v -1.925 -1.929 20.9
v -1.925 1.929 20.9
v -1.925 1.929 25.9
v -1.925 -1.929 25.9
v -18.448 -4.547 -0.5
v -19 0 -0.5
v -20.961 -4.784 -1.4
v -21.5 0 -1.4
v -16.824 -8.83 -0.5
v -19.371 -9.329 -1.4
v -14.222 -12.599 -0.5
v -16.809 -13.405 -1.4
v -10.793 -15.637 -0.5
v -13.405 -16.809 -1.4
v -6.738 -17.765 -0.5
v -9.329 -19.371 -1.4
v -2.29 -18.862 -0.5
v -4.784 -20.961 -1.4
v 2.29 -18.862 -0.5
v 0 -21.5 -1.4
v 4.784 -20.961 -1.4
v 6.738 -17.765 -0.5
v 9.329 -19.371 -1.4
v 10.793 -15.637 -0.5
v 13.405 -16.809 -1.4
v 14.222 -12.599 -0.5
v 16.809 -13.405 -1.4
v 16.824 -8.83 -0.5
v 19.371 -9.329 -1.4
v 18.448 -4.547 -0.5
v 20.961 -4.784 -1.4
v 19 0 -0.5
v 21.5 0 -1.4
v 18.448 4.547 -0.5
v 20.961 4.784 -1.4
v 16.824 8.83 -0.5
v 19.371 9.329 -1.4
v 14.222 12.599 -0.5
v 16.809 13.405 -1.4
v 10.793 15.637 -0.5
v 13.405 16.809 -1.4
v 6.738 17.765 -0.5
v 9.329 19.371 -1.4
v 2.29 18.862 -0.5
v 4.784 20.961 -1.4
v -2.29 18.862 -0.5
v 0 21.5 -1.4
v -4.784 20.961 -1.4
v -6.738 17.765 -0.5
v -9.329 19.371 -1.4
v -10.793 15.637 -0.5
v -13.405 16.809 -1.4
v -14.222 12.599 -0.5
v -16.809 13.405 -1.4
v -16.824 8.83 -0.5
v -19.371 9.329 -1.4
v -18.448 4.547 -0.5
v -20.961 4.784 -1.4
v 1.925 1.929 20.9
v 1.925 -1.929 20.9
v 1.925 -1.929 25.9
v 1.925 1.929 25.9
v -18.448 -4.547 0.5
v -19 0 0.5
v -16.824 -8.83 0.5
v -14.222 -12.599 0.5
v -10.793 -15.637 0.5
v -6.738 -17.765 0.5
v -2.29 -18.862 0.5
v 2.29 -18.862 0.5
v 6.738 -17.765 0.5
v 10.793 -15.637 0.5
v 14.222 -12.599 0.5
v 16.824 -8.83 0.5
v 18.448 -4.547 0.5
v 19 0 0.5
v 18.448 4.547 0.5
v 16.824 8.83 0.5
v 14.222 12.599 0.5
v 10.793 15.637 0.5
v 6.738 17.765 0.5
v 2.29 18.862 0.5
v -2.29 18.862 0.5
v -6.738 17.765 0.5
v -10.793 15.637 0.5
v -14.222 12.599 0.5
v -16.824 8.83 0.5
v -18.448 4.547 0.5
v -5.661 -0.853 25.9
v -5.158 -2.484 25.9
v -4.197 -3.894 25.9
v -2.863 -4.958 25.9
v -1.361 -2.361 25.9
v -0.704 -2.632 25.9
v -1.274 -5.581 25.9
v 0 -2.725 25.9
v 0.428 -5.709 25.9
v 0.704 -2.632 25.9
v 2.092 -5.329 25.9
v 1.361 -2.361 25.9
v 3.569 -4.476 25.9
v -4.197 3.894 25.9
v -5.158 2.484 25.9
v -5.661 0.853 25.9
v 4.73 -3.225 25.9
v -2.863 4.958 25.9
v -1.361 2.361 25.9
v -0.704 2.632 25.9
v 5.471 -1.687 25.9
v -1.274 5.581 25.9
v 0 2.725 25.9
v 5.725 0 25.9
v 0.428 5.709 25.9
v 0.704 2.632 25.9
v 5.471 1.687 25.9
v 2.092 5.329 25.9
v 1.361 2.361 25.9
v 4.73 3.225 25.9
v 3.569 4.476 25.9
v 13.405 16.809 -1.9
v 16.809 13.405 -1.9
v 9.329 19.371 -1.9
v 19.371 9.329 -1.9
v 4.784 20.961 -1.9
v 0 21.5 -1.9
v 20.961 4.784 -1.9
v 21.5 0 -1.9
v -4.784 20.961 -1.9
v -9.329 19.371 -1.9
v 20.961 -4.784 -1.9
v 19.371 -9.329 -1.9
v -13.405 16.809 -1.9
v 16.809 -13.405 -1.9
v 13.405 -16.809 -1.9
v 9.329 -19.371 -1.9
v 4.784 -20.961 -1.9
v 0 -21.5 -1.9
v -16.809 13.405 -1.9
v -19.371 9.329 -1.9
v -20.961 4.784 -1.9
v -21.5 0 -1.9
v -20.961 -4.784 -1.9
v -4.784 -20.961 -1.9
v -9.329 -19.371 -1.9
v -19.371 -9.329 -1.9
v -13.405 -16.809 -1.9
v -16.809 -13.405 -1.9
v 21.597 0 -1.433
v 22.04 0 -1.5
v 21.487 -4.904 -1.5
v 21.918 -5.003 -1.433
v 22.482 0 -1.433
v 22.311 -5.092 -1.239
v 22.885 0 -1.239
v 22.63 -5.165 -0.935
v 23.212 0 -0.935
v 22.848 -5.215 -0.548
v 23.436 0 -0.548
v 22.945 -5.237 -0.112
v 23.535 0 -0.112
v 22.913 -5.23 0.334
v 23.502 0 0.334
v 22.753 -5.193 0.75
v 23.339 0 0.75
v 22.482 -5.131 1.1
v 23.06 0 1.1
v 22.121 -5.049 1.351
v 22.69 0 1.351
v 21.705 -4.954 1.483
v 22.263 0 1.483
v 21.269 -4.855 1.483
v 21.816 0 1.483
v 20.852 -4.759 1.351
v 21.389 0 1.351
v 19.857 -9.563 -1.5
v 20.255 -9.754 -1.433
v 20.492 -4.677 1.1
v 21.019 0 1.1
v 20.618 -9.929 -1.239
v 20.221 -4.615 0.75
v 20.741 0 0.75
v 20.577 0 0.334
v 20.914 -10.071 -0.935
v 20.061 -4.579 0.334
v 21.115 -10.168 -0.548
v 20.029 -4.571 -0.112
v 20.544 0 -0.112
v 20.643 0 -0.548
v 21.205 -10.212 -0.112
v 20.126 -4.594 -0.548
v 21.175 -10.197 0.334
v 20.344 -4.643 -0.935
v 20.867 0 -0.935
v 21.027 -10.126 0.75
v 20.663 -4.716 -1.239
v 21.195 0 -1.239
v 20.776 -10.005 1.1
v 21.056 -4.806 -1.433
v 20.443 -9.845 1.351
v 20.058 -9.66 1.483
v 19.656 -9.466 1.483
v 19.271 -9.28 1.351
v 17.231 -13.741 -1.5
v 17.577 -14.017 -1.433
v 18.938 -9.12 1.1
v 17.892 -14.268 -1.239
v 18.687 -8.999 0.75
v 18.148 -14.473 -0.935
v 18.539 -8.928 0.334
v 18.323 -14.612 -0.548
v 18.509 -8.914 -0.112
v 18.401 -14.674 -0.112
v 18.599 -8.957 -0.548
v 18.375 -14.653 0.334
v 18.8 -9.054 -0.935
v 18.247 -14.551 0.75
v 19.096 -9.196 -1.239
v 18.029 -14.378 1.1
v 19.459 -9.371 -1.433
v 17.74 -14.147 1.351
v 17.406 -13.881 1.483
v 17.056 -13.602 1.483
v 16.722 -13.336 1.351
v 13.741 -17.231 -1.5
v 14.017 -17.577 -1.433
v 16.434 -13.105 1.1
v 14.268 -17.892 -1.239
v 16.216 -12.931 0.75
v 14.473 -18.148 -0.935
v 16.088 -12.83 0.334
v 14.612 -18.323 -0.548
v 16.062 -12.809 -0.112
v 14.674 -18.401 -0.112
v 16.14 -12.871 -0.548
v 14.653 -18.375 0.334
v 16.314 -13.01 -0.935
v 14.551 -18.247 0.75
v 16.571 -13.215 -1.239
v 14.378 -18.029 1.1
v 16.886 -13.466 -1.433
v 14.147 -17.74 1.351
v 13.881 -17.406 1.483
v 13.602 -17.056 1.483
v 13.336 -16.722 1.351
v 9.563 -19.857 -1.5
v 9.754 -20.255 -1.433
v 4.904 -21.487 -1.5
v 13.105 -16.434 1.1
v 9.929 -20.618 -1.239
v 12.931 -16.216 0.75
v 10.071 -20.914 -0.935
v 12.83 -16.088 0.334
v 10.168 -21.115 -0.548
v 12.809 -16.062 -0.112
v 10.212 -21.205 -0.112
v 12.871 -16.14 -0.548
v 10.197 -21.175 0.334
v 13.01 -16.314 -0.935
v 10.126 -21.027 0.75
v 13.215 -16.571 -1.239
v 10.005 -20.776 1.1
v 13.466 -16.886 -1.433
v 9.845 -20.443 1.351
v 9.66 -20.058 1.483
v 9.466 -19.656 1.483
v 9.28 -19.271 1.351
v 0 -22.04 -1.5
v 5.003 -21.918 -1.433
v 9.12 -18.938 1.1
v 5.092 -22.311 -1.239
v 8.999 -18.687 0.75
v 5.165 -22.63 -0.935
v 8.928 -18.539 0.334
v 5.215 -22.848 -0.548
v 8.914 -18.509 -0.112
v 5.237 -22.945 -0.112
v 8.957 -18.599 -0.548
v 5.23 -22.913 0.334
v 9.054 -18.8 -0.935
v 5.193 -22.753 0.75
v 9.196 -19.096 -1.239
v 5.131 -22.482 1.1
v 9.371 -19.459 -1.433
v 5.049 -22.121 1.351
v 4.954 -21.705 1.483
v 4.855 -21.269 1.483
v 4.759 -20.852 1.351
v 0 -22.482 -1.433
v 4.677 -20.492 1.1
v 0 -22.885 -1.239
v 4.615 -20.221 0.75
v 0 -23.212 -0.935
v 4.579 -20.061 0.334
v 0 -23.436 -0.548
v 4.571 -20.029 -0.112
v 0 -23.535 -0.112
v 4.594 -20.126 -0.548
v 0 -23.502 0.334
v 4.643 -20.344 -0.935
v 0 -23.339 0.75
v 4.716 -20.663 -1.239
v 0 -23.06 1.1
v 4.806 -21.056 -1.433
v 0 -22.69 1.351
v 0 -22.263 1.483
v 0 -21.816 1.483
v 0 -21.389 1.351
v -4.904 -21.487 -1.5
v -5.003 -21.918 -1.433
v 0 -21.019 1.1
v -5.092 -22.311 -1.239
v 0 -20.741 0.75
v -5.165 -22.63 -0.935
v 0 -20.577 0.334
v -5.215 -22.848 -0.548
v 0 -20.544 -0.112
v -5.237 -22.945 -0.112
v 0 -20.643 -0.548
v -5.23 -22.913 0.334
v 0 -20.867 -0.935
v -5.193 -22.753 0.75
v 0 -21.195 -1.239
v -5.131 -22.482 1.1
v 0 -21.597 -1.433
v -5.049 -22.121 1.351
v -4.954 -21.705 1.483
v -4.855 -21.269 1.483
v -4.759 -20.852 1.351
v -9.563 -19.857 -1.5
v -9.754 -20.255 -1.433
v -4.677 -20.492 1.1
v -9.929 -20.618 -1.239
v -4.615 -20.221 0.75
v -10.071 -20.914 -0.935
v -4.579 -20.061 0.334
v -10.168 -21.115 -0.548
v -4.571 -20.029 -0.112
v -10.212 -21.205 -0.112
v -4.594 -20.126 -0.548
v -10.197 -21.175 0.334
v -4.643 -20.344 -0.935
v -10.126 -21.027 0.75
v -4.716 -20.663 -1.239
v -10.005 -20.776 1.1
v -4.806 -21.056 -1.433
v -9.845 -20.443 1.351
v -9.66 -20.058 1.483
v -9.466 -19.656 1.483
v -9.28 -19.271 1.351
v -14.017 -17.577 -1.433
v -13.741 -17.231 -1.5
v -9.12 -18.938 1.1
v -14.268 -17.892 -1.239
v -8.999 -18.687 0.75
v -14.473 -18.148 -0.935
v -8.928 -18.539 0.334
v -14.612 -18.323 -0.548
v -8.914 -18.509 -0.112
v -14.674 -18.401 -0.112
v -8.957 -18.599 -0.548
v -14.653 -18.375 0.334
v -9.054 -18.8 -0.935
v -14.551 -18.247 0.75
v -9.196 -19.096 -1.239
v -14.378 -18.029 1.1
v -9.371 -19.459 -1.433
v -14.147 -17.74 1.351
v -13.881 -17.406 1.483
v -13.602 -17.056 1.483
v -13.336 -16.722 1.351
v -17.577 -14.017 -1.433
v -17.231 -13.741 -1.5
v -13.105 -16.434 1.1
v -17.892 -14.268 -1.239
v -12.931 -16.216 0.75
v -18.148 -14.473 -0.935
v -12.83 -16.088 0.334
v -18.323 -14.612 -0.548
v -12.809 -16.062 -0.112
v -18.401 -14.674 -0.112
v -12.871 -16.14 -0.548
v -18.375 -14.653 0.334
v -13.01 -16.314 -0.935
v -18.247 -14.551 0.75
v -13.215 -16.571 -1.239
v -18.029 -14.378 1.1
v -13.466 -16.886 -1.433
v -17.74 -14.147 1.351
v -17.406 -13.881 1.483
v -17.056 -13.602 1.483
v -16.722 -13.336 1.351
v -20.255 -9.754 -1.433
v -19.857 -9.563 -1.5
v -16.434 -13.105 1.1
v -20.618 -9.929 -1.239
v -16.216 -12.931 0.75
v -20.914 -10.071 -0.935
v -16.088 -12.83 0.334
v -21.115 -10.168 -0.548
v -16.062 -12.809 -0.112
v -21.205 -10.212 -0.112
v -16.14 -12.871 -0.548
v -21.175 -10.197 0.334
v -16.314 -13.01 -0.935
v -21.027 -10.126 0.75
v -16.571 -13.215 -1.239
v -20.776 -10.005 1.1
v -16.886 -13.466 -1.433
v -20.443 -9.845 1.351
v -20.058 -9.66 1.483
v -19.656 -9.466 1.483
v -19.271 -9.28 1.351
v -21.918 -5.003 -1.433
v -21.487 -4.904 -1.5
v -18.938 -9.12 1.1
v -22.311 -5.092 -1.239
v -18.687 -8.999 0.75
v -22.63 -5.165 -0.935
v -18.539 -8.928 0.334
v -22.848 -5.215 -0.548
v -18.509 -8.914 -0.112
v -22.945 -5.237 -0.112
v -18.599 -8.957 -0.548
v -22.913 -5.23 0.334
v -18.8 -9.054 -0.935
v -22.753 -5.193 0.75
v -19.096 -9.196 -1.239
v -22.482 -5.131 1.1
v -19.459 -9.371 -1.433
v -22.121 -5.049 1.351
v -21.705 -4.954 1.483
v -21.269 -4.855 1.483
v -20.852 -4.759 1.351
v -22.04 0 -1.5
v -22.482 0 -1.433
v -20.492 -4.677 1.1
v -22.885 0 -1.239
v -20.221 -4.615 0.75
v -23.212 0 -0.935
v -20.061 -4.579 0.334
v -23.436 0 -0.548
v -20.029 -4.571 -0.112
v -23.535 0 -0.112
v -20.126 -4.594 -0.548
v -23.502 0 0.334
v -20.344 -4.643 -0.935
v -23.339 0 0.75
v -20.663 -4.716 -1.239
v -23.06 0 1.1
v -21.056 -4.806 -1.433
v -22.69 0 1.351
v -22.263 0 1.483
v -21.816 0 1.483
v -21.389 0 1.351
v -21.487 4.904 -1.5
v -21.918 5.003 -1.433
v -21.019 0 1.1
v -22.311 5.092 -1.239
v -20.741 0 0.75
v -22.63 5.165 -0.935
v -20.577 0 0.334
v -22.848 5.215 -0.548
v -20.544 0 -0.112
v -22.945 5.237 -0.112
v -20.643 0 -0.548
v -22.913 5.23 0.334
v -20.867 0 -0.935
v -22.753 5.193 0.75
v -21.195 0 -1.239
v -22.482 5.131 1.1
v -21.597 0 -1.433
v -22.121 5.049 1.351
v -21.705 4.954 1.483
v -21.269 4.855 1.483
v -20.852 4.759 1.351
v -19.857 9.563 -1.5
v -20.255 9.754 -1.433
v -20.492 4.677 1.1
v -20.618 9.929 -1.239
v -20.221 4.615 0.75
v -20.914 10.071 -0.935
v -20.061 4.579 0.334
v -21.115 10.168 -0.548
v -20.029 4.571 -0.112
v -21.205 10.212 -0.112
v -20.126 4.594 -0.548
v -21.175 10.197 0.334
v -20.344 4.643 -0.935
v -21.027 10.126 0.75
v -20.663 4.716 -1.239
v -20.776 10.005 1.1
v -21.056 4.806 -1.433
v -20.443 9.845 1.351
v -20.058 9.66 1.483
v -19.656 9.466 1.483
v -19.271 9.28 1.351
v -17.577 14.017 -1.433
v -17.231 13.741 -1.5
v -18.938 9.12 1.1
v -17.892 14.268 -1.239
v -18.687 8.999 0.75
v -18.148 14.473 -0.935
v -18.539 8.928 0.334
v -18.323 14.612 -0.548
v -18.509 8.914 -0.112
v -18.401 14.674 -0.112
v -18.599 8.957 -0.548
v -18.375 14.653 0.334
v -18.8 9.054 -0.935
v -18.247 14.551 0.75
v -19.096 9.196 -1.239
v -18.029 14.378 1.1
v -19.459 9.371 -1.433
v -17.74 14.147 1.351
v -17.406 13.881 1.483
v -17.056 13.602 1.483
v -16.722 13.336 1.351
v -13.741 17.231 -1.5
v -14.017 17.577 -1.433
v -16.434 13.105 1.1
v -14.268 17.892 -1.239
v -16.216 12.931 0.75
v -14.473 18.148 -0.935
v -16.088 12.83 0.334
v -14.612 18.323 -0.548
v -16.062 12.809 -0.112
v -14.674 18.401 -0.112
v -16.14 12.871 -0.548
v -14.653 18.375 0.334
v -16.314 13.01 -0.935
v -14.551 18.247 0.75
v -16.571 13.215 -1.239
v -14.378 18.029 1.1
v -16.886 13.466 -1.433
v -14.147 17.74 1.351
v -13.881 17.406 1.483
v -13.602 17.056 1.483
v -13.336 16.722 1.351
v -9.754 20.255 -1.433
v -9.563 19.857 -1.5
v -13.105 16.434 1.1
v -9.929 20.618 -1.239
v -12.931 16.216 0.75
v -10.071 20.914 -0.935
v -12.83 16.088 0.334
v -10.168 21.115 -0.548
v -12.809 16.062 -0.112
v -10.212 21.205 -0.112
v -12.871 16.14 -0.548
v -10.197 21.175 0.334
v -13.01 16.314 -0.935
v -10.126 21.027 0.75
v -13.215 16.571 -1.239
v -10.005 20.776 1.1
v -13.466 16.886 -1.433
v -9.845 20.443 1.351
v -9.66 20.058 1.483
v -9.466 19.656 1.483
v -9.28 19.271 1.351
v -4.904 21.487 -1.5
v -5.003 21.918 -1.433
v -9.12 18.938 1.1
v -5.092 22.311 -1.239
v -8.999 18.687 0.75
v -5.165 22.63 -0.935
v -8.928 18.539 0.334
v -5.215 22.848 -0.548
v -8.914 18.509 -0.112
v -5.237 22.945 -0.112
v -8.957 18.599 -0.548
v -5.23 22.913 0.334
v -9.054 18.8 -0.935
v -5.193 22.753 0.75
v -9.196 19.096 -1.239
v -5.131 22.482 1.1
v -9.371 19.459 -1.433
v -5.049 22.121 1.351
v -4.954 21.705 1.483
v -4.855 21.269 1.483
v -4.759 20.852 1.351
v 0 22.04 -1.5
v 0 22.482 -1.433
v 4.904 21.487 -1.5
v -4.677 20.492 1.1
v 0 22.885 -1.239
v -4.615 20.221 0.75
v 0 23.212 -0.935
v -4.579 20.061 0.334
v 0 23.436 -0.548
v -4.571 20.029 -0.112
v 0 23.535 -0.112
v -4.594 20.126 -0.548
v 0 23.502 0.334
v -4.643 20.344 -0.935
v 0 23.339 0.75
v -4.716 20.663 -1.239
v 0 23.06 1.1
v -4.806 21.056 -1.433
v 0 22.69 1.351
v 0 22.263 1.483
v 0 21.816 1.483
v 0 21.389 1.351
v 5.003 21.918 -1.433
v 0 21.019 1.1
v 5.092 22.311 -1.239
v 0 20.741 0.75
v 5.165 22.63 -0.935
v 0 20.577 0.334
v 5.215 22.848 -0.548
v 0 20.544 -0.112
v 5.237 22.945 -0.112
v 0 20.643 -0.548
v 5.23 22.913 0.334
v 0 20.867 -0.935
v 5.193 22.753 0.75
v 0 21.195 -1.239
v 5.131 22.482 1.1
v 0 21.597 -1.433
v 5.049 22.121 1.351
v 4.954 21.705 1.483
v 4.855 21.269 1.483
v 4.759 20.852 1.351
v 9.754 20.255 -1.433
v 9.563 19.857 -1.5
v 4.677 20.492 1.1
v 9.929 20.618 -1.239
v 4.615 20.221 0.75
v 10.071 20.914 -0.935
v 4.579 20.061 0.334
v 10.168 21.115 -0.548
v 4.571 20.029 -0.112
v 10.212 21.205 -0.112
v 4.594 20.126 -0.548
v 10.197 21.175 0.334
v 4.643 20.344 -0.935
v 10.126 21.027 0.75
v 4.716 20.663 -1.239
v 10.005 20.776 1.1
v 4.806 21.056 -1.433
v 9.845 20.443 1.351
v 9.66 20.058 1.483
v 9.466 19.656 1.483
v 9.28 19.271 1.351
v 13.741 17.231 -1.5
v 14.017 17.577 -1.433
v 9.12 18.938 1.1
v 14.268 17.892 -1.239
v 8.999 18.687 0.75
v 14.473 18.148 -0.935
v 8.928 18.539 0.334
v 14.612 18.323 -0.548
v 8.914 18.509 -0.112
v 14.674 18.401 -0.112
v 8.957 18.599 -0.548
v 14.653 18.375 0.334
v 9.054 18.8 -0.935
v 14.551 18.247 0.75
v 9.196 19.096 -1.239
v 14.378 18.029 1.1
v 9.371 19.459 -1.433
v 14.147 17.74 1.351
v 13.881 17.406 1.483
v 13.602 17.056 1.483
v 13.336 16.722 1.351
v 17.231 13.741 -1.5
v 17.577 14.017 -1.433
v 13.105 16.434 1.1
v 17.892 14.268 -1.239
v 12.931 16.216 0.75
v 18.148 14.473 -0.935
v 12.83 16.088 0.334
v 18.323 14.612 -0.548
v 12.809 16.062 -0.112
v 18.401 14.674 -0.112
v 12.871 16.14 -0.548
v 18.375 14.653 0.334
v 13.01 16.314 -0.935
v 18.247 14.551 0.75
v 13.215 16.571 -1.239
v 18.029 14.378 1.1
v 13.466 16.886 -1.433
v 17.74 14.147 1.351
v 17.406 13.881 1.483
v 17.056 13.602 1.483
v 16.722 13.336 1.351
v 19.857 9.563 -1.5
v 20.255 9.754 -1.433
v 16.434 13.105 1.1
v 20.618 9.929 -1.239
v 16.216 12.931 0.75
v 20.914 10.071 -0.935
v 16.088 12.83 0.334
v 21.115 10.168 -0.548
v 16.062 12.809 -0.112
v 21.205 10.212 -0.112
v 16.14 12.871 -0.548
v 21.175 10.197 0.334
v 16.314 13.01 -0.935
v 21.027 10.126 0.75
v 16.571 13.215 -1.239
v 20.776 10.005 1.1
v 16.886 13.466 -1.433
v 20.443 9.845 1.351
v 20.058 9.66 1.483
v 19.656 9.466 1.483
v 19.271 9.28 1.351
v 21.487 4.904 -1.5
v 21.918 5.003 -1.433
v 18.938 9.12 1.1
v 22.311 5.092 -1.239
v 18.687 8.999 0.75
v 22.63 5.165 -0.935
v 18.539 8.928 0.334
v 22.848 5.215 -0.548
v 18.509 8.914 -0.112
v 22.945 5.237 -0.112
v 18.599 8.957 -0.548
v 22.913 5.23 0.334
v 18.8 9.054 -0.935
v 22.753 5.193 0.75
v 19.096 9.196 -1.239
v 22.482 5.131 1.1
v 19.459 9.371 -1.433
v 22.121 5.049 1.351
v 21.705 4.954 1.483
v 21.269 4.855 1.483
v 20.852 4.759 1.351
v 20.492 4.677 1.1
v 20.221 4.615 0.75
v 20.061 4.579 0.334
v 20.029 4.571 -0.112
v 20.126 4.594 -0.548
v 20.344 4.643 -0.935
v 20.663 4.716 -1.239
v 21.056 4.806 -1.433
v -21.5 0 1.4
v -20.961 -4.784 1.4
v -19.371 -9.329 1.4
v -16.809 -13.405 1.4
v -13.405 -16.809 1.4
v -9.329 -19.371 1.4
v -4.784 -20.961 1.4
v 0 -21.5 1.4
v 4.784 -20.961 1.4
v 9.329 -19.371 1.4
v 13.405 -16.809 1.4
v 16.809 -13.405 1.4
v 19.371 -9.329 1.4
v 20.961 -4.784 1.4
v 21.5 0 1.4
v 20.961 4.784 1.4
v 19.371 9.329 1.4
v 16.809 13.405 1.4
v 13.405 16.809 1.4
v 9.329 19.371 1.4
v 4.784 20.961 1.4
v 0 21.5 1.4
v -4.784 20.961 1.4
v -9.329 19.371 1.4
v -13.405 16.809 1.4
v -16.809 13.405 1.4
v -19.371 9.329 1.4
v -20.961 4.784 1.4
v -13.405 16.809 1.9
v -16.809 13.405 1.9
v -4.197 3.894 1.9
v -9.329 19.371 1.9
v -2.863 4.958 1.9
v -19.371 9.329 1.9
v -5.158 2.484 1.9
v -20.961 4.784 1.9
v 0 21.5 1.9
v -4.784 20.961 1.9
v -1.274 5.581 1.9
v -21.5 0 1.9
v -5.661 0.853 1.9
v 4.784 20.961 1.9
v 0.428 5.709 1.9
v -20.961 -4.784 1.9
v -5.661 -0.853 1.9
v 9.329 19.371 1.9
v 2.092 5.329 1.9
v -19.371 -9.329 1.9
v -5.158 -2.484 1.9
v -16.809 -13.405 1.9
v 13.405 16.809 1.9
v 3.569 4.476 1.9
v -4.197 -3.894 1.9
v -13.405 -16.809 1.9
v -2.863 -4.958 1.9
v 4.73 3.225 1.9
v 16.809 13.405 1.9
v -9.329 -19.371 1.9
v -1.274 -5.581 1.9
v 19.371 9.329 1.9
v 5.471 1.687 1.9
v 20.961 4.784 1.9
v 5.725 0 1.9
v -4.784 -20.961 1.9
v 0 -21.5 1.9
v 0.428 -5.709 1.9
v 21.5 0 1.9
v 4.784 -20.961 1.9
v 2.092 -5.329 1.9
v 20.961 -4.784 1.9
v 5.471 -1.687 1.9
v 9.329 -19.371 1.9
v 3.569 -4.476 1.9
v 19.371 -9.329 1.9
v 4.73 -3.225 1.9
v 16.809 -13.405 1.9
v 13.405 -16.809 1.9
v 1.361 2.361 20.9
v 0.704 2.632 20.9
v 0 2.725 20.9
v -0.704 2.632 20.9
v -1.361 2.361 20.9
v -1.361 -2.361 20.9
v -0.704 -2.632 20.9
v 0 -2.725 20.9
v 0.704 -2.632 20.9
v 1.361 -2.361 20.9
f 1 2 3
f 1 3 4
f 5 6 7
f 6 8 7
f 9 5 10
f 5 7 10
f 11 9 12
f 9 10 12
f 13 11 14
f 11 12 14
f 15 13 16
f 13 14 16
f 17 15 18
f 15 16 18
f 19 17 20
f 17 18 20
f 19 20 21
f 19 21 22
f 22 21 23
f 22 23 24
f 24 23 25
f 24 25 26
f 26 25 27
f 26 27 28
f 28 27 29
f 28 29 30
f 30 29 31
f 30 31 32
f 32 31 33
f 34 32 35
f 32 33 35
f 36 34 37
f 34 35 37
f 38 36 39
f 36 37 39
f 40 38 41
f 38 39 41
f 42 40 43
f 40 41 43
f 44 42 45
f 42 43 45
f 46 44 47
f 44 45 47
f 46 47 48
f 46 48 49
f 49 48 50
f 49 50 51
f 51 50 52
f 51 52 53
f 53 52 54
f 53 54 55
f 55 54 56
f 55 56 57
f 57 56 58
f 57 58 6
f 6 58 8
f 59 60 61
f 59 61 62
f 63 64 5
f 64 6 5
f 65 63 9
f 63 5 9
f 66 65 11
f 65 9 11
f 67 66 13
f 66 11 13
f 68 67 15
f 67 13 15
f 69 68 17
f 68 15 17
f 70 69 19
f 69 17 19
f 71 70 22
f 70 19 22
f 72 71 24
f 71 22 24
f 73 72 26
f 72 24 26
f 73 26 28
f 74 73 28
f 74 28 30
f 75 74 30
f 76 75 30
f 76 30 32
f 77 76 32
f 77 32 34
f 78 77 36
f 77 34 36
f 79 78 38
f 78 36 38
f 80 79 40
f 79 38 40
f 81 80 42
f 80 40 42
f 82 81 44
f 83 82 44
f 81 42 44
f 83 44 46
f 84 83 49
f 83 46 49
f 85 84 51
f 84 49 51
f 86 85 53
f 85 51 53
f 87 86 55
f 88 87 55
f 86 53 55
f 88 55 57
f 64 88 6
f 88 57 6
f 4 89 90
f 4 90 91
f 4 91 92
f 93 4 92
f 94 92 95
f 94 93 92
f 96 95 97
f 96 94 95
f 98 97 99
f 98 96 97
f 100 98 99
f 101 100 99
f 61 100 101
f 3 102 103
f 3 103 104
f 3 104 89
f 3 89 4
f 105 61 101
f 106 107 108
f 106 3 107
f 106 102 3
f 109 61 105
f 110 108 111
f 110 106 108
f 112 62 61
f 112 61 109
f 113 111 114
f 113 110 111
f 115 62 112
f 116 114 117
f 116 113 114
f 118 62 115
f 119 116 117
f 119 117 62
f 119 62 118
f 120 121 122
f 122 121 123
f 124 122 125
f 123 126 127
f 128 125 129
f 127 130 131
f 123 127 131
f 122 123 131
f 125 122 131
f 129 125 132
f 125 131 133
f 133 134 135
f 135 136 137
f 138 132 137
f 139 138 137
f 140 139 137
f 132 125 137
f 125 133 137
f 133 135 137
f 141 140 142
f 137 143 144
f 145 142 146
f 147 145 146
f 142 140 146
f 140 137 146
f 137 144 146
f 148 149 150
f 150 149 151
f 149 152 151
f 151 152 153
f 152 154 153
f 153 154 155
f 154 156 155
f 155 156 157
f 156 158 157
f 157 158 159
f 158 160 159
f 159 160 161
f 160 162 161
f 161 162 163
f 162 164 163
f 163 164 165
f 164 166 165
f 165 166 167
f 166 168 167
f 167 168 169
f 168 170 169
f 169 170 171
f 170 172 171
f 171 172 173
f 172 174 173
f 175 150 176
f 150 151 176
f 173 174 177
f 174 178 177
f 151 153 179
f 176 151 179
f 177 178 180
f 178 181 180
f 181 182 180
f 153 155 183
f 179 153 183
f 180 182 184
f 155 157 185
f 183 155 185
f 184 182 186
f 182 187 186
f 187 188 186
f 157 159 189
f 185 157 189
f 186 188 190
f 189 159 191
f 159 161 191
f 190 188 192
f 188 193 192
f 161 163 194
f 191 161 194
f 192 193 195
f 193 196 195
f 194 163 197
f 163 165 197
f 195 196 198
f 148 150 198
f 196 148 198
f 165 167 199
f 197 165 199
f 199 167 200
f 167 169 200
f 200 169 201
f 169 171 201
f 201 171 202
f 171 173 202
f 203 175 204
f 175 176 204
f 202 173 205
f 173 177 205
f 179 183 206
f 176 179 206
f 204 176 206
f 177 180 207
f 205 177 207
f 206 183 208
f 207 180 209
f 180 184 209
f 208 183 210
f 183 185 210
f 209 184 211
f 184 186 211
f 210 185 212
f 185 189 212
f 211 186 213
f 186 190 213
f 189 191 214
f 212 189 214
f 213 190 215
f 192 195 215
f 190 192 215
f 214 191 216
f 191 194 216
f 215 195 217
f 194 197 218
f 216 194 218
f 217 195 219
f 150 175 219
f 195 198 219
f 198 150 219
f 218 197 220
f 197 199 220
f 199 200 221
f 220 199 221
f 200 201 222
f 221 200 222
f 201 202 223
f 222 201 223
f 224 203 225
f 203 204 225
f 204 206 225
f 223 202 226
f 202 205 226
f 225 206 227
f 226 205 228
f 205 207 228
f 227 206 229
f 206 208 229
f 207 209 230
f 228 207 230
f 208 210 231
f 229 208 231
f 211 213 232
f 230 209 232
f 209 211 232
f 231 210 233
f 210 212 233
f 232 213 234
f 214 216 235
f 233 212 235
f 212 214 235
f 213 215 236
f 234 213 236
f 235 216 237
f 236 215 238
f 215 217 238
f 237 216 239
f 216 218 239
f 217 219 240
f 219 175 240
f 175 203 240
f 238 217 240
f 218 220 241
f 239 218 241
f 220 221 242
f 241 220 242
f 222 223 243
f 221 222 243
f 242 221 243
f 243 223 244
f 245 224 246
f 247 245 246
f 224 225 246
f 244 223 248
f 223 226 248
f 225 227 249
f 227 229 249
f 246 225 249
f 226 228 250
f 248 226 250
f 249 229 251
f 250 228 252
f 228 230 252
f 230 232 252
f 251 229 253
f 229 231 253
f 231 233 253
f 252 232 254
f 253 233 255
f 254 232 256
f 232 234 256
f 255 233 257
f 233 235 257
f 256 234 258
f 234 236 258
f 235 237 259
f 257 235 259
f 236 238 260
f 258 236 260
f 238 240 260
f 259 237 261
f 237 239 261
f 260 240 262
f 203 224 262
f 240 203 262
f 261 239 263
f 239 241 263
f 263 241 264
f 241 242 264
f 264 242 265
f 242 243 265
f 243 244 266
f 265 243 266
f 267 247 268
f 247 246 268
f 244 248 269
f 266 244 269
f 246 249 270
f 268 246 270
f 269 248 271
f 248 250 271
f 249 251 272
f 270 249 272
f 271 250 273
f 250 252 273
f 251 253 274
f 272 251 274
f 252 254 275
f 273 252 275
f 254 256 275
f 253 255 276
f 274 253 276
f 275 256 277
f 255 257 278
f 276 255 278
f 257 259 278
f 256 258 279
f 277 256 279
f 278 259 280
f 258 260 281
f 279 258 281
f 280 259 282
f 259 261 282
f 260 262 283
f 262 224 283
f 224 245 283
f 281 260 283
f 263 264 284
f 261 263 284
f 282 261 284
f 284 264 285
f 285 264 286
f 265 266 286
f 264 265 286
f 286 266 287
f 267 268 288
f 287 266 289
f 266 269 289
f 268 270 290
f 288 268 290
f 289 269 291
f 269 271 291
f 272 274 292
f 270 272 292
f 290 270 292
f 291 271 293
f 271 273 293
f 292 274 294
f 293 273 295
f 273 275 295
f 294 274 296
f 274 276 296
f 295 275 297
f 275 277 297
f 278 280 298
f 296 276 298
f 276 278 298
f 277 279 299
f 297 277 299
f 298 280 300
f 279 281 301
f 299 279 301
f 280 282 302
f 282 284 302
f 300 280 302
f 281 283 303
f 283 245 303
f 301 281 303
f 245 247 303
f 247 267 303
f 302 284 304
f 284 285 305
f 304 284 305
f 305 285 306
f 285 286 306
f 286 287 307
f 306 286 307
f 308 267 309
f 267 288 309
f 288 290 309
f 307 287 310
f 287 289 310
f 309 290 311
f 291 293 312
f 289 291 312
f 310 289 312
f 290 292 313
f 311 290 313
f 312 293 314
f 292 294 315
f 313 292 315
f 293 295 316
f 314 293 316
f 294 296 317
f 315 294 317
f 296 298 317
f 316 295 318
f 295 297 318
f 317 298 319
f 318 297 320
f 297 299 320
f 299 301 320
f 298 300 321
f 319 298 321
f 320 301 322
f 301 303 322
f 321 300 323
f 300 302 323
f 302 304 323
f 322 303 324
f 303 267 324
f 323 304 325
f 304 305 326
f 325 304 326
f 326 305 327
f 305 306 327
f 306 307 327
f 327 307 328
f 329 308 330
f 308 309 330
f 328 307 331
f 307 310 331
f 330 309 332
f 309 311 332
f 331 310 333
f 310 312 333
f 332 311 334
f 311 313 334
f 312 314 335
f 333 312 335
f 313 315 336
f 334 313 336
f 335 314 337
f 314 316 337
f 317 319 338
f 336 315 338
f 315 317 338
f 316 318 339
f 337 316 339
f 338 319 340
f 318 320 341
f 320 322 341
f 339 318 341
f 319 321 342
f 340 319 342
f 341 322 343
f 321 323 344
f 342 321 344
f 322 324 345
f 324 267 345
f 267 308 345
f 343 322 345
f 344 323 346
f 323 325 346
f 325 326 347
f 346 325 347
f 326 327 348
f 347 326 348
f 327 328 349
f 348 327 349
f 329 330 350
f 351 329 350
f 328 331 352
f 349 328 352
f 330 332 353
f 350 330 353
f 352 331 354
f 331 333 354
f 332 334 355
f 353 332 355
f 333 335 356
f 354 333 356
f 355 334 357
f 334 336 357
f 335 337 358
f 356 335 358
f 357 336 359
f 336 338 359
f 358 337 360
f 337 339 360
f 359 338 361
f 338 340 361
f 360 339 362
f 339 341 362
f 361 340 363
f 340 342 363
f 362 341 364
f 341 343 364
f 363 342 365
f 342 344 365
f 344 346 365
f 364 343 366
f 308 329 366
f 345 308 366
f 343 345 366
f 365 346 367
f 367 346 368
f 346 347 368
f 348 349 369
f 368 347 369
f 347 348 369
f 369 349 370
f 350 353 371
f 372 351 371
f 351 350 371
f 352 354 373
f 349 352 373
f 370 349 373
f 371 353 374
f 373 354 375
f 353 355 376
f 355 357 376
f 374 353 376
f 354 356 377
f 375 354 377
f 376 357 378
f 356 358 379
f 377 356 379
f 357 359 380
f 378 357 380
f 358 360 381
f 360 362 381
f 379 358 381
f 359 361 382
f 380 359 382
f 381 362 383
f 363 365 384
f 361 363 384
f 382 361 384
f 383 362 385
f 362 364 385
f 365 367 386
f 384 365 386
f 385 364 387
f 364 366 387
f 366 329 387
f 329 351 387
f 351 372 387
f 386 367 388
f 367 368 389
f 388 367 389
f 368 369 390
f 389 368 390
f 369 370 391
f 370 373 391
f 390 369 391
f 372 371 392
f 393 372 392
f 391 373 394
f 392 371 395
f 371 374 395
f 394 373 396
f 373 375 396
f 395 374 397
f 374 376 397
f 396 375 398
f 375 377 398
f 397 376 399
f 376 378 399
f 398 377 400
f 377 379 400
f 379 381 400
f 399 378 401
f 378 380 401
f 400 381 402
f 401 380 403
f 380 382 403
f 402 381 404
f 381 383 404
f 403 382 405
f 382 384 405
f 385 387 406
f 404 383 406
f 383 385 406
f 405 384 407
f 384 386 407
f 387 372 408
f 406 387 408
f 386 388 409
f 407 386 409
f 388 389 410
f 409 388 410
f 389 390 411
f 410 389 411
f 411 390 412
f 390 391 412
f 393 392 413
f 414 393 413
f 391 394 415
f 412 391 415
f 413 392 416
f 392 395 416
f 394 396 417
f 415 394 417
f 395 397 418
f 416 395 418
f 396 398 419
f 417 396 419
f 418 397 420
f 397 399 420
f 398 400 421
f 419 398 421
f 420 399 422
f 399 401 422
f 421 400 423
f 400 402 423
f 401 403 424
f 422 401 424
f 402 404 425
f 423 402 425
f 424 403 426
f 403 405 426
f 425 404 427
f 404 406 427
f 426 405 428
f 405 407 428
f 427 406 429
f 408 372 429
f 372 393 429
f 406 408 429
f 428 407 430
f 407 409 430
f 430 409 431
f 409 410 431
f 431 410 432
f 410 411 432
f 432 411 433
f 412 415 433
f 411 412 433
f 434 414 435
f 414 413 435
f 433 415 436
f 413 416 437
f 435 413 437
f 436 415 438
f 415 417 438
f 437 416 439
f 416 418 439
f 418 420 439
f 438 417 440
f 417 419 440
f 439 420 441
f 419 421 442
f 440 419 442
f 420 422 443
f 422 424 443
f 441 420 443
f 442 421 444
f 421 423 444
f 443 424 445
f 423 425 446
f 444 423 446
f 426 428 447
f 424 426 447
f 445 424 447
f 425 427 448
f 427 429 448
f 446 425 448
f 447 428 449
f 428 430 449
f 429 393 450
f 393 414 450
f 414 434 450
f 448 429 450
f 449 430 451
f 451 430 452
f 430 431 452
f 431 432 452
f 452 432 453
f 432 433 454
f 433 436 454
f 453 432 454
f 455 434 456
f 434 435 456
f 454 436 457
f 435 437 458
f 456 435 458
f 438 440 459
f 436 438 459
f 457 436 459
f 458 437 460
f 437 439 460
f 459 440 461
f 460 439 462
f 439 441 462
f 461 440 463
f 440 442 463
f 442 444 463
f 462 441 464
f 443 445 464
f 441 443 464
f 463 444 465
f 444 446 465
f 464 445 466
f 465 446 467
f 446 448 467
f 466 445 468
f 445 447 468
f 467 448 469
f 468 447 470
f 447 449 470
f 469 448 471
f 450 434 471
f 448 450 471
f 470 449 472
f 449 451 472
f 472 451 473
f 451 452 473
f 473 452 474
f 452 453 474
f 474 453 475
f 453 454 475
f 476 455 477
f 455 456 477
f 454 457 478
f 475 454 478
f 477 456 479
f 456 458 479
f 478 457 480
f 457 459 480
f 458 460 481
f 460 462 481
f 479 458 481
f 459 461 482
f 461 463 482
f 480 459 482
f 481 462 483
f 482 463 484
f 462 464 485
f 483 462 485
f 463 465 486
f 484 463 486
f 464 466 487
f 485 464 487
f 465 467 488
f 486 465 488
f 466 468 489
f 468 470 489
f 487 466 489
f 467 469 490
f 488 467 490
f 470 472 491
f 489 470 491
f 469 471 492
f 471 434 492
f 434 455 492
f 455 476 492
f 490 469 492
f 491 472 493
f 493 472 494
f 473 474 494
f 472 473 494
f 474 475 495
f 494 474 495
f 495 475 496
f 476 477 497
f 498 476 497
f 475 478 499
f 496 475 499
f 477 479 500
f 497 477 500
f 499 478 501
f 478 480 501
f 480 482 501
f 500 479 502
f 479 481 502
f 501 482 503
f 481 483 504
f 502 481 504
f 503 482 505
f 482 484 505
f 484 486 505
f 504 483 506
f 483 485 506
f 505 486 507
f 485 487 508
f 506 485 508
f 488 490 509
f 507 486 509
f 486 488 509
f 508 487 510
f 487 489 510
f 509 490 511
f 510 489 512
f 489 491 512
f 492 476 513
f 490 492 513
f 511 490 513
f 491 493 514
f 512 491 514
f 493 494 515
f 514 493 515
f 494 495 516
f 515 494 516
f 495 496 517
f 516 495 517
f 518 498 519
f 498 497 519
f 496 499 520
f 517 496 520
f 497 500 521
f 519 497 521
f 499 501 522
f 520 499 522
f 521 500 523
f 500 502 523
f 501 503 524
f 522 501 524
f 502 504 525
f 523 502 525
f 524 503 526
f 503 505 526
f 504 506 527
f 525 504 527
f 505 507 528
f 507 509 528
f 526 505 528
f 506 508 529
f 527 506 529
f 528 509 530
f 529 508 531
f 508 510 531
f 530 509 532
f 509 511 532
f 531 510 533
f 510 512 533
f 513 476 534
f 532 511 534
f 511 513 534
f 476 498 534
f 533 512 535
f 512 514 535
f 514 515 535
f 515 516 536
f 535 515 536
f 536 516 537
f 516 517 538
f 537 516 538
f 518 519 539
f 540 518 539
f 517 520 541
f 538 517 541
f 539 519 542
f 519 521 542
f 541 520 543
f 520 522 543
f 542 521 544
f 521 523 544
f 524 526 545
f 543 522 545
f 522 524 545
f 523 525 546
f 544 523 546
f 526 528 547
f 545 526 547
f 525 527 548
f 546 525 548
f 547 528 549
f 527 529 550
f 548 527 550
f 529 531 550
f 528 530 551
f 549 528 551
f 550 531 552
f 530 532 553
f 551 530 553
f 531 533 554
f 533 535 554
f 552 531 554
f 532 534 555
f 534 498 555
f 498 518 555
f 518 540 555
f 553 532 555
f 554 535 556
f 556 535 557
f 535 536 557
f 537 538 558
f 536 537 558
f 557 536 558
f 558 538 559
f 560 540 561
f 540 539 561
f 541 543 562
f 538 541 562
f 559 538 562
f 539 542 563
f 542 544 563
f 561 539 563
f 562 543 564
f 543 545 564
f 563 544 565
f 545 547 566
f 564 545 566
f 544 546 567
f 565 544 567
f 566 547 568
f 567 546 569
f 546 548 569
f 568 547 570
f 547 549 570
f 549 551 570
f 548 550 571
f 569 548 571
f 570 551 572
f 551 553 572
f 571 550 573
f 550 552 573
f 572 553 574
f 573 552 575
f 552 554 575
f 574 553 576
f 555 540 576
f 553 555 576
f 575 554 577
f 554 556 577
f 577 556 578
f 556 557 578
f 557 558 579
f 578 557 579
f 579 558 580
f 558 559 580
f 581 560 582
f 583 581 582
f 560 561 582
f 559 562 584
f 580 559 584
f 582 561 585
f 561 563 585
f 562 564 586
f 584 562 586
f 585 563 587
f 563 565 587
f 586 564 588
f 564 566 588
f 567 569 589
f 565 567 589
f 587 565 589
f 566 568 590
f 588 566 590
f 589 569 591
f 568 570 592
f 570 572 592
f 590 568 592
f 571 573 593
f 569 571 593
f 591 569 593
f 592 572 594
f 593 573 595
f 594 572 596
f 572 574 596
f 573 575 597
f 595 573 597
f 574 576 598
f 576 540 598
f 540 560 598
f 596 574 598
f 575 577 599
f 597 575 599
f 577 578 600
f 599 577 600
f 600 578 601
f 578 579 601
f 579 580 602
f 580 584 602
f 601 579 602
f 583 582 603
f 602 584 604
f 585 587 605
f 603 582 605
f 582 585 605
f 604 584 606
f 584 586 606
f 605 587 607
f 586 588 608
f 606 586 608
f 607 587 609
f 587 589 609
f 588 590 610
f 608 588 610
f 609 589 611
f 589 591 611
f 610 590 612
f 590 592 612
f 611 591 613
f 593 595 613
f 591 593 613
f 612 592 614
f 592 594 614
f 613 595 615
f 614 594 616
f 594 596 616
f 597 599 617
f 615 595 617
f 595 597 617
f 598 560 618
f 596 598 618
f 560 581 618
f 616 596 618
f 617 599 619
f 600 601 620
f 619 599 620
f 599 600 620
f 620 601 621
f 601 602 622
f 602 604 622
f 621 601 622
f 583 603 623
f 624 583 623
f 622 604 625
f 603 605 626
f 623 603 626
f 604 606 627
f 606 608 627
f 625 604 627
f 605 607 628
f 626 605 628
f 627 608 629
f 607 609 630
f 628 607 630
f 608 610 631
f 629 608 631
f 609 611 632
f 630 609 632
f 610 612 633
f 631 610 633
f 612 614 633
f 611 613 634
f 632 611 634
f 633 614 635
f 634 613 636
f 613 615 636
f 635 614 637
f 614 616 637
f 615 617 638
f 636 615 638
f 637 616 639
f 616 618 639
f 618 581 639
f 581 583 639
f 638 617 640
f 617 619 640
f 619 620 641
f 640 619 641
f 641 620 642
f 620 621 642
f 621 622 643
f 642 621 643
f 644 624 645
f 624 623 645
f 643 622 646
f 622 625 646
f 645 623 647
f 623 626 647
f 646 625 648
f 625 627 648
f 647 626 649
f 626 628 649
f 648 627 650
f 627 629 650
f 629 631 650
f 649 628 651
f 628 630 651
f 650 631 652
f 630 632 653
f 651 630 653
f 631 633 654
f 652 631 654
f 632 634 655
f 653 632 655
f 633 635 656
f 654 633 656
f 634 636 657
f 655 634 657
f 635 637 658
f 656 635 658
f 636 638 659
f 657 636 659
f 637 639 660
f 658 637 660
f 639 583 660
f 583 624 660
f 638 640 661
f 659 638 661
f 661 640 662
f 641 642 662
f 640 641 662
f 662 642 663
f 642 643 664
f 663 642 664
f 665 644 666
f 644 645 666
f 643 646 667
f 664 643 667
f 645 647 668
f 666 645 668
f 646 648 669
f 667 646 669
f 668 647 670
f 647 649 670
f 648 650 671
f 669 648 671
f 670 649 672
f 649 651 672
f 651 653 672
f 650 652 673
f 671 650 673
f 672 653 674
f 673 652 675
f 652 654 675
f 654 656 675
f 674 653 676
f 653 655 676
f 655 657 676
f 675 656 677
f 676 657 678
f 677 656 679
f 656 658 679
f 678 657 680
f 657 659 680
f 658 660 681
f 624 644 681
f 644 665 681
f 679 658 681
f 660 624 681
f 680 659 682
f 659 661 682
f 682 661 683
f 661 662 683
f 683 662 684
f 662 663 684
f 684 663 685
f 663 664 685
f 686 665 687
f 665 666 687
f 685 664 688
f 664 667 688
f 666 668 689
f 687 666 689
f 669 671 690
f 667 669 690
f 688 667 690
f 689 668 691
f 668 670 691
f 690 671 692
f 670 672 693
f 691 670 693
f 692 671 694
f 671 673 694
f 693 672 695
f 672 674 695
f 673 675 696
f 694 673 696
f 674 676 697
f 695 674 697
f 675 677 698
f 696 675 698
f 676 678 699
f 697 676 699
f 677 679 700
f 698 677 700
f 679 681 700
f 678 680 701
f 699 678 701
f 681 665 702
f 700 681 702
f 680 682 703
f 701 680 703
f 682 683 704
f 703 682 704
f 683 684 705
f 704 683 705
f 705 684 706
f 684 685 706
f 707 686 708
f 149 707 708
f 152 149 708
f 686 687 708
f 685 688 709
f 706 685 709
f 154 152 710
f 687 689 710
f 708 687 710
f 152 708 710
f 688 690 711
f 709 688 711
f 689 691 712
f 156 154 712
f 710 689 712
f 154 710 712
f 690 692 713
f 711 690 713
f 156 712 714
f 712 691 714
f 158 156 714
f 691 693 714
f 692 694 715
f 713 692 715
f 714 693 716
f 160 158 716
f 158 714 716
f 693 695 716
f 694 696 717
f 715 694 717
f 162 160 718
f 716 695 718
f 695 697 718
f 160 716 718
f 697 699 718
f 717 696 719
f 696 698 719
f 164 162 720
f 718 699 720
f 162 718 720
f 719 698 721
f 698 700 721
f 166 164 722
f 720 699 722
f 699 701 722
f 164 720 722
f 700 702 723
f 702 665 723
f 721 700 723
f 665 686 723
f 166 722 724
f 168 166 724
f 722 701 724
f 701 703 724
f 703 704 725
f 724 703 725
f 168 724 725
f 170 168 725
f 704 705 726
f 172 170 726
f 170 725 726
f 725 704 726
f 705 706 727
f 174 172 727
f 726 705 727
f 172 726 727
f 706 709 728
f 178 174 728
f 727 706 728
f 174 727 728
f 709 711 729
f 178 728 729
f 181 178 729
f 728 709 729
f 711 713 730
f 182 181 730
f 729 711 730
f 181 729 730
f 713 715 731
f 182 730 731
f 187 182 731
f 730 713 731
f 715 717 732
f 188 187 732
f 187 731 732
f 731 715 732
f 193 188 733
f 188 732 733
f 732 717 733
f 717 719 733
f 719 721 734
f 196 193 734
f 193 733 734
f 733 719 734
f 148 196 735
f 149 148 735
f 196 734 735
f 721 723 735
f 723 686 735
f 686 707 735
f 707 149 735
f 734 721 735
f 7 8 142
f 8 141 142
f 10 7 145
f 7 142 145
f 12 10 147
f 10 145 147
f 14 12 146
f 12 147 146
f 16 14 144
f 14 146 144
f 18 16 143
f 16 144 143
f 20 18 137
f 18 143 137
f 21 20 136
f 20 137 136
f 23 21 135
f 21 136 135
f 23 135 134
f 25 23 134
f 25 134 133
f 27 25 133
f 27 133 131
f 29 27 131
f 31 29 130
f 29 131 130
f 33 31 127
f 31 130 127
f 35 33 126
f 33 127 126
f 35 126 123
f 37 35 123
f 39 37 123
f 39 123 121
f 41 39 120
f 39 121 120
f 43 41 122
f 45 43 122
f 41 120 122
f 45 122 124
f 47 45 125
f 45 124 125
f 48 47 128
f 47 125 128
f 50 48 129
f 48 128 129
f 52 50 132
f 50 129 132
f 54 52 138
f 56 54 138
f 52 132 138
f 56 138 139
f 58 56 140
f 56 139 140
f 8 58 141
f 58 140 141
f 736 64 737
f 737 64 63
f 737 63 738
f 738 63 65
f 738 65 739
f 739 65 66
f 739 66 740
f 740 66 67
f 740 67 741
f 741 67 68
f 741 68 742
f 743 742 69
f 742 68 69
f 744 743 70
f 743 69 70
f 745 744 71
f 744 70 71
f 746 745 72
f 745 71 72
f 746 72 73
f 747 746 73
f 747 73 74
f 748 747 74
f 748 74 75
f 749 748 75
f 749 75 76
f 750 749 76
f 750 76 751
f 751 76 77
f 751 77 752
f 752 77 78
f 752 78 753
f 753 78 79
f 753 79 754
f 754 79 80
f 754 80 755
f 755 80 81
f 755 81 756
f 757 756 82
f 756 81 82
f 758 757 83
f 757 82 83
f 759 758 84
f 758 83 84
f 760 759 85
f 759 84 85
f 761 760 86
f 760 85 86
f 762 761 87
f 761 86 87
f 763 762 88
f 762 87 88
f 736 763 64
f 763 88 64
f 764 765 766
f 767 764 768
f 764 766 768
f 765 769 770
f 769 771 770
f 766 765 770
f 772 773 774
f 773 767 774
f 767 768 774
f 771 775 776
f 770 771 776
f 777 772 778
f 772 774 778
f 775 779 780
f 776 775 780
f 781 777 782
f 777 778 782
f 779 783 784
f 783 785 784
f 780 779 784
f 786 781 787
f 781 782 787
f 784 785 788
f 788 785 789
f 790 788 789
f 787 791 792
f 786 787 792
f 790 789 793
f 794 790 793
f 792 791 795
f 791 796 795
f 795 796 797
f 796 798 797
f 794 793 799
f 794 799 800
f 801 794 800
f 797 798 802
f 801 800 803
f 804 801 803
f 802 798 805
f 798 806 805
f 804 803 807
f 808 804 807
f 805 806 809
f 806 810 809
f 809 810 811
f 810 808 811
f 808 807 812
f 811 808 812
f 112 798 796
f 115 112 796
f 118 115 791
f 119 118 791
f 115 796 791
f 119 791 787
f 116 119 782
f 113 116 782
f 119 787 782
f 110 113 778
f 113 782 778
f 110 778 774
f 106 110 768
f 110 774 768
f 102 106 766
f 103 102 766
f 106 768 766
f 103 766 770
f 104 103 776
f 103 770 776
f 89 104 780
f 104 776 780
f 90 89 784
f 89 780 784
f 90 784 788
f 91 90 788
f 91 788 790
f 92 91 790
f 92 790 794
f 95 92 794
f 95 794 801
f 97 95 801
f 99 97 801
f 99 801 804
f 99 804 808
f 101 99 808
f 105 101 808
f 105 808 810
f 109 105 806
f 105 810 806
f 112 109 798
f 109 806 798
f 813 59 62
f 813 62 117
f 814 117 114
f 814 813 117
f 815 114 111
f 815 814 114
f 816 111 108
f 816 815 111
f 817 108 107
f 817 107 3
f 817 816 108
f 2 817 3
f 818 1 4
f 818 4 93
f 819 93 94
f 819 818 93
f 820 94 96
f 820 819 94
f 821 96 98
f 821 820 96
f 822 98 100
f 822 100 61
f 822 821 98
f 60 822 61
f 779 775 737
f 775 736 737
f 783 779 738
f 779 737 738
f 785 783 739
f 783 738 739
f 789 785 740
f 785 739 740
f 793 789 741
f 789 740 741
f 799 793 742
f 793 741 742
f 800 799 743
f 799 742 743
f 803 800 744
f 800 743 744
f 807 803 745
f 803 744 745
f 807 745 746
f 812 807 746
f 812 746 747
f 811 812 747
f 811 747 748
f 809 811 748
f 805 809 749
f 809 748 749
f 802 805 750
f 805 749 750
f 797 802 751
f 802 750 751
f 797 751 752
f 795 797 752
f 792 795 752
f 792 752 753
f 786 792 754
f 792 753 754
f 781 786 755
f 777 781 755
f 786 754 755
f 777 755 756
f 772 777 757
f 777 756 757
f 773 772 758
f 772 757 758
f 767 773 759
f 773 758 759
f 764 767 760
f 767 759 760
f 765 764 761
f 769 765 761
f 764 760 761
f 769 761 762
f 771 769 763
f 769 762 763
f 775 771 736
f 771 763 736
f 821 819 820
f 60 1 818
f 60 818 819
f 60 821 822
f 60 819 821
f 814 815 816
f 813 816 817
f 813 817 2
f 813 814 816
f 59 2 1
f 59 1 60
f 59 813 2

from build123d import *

# Parameters (mm, degrees)
CROQUIS3_R              = 5.725
SALIENTE_EXTRUIR2_DEPTH = 24
SALIENTE_EXTRUIR3_REACH = 48.199
SALIENTE_EXTRUIR3_START = -5
CROQUIS5_R              = 1.5


with BuildPart() as part:
    # Croquis1 → Revolución1 (revolve)
    with BuildSketch(Plane(origin=(0, 0, 0), x_dir=(0, 0, -1), z_dir=(1, 0, 0)), mode=Mode.PRIVATE) as revoluci_n1_sk:
        Polygon((-1.9, 0), (-1.9, 21.5), (-1.4, 21.5), (-0.5, 19.000153831), (0.5, 19.000153831), (1.4, 21.5), (1.9, 21.5), (1.9, 0), align=None)
    revolve(revoluci_n1_sk.sketch.rotate(Axis((0, 0, -6.227056579), (0, 0, 1)), 90), axis=Axis((0, 0, -6.227056579), (0, 0, 1)))

    # Croquis3 → Saliente-Extruir2 (add)
    with BuildSketch(Plane.XY.offset(1.9)):
        Circle(CROQUIS3_R)
        with BuildLine():
            Line((-1.925, 1.928730152), (-1.925, -1.928730152))
            ThreePointArc((-1.925, -1.928730152), (0, -2.725), (1.925, -1.928730152))
            Line((1.925, -1.928730152), (1.925, 1.928730152))
            ThreePointArc((1.925, 1.928730152), (0, 2.725), (-1.925, 1.928730152))
        make_face(mode=Mode.SUBTRACT)
    extrude(amount=SALIENTE_EXTRUIR2_DEPTH)

    # Croquis4 → Saliente-Extruir3 (add, up to next)
    with BuildSketch(Plane.XY.offset(25.9).offset(SALIENTE_EXTRUIR3_START), mode=Mode.PRIVATE) as saliente_extruir3_sk1:
        with BuildLine():
            Line((-1.925, 1.928730152), (-1.925, -1.928730152))
            ThreePointArc((-1.925, -1.928730152), (0, -2.725), (1.925, -1.928730152))
            Line((1.925, -1.928730152), (1.925, 1.928730152))
            ThreePointArc((1.925, 1.928730152), (0, 2.725), (-1.925, 1.928730152))
        make_face()
    saliente_extruir3_tool1 = extrude(saliente_extruir3_sk1.sketch, amount=-SALIENTE_EXTRUIR3_REACH, mode=Mode.PRIVATE) - part.part
    add(saliente_extruir3_tool1.solids().sort_by_distance((0, 0, 20.9))[0])


with BuildPart() as body_2:
    # Croquis5 → Revolución2 (revolve)
    with BuildSketch(Plane(origin=(0, 0, 0), x_dir=(0, 0, -1), z_dir=(1, 0, 0)), mode=Mode.PRIVATE) as revoluci_n2_sk:
        with Locations((0, 22.039552594)):
            Circle(CROQUIS5_R)
    revolve(revoluci_n2_sk.sketch.rotate(Axis((0, 0, 9.093206655), (0, 0, -1)), 90), axis=Axis((0, 0, 9.093206655), (0, 0, -1)))


solid = Compound([part.part, body_2.part])
